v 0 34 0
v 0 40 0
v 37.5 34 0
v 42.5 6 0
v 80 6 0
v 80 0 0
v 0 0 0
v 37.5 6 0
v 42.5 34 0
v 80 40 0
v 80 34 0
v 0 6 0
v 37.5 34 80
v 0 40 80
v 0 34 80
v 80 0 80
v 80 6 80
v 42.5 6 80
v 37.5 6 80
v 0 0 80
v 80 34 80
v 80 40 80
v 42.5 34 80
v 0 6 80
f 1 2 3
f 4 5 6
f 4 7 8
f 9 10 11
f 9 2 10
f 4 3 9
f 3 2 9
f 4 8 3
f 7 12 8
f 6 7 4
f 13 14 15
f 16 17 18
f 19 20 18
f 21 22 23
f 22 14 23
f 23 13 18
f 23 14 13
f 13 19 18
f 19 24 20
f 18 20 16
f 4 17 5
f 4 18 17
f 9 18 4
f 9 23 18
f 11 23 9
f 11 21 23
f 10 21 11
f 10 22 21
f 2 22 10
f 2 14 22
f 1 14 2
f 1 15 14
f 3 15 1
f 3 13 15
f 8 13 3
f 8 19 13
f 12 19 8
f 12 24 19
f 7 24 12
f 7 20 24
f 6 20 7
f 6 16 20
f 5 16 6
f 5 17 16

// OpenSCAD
$fn = 32;

// ----------------------------------------------------------------------
// Structural section: ibeam 80 x 40 mm
// ----------------------------------------------------------------------

// --- parameters (mm) ---
sec_w = 80;               // section width, X
sec_h = 40;               // section height, Y
flange_t = 6;             // flange thickness
web_t = 5;                // web thickness
plate_t = 80;             // cut length, Z (extrusion height)
fit_tol = 0.02;           // declared fit tolerance (prompt contract)
free_tol = 0.2;           // declared free tolerance (prompt contract)

profile = [[0, 0], [80, 0], [80, 6], [42.5, 6], [42.5, 34], [80, 34], [80, 40], [0, 40], [0, 34], [37.5, 34], [37.5, 6], [0, 6]];  // primary outline, 12 points, counter clockwise

// --- the one profile operation ---
linear_extrude(height = plate_t) polygon(points = profile);
